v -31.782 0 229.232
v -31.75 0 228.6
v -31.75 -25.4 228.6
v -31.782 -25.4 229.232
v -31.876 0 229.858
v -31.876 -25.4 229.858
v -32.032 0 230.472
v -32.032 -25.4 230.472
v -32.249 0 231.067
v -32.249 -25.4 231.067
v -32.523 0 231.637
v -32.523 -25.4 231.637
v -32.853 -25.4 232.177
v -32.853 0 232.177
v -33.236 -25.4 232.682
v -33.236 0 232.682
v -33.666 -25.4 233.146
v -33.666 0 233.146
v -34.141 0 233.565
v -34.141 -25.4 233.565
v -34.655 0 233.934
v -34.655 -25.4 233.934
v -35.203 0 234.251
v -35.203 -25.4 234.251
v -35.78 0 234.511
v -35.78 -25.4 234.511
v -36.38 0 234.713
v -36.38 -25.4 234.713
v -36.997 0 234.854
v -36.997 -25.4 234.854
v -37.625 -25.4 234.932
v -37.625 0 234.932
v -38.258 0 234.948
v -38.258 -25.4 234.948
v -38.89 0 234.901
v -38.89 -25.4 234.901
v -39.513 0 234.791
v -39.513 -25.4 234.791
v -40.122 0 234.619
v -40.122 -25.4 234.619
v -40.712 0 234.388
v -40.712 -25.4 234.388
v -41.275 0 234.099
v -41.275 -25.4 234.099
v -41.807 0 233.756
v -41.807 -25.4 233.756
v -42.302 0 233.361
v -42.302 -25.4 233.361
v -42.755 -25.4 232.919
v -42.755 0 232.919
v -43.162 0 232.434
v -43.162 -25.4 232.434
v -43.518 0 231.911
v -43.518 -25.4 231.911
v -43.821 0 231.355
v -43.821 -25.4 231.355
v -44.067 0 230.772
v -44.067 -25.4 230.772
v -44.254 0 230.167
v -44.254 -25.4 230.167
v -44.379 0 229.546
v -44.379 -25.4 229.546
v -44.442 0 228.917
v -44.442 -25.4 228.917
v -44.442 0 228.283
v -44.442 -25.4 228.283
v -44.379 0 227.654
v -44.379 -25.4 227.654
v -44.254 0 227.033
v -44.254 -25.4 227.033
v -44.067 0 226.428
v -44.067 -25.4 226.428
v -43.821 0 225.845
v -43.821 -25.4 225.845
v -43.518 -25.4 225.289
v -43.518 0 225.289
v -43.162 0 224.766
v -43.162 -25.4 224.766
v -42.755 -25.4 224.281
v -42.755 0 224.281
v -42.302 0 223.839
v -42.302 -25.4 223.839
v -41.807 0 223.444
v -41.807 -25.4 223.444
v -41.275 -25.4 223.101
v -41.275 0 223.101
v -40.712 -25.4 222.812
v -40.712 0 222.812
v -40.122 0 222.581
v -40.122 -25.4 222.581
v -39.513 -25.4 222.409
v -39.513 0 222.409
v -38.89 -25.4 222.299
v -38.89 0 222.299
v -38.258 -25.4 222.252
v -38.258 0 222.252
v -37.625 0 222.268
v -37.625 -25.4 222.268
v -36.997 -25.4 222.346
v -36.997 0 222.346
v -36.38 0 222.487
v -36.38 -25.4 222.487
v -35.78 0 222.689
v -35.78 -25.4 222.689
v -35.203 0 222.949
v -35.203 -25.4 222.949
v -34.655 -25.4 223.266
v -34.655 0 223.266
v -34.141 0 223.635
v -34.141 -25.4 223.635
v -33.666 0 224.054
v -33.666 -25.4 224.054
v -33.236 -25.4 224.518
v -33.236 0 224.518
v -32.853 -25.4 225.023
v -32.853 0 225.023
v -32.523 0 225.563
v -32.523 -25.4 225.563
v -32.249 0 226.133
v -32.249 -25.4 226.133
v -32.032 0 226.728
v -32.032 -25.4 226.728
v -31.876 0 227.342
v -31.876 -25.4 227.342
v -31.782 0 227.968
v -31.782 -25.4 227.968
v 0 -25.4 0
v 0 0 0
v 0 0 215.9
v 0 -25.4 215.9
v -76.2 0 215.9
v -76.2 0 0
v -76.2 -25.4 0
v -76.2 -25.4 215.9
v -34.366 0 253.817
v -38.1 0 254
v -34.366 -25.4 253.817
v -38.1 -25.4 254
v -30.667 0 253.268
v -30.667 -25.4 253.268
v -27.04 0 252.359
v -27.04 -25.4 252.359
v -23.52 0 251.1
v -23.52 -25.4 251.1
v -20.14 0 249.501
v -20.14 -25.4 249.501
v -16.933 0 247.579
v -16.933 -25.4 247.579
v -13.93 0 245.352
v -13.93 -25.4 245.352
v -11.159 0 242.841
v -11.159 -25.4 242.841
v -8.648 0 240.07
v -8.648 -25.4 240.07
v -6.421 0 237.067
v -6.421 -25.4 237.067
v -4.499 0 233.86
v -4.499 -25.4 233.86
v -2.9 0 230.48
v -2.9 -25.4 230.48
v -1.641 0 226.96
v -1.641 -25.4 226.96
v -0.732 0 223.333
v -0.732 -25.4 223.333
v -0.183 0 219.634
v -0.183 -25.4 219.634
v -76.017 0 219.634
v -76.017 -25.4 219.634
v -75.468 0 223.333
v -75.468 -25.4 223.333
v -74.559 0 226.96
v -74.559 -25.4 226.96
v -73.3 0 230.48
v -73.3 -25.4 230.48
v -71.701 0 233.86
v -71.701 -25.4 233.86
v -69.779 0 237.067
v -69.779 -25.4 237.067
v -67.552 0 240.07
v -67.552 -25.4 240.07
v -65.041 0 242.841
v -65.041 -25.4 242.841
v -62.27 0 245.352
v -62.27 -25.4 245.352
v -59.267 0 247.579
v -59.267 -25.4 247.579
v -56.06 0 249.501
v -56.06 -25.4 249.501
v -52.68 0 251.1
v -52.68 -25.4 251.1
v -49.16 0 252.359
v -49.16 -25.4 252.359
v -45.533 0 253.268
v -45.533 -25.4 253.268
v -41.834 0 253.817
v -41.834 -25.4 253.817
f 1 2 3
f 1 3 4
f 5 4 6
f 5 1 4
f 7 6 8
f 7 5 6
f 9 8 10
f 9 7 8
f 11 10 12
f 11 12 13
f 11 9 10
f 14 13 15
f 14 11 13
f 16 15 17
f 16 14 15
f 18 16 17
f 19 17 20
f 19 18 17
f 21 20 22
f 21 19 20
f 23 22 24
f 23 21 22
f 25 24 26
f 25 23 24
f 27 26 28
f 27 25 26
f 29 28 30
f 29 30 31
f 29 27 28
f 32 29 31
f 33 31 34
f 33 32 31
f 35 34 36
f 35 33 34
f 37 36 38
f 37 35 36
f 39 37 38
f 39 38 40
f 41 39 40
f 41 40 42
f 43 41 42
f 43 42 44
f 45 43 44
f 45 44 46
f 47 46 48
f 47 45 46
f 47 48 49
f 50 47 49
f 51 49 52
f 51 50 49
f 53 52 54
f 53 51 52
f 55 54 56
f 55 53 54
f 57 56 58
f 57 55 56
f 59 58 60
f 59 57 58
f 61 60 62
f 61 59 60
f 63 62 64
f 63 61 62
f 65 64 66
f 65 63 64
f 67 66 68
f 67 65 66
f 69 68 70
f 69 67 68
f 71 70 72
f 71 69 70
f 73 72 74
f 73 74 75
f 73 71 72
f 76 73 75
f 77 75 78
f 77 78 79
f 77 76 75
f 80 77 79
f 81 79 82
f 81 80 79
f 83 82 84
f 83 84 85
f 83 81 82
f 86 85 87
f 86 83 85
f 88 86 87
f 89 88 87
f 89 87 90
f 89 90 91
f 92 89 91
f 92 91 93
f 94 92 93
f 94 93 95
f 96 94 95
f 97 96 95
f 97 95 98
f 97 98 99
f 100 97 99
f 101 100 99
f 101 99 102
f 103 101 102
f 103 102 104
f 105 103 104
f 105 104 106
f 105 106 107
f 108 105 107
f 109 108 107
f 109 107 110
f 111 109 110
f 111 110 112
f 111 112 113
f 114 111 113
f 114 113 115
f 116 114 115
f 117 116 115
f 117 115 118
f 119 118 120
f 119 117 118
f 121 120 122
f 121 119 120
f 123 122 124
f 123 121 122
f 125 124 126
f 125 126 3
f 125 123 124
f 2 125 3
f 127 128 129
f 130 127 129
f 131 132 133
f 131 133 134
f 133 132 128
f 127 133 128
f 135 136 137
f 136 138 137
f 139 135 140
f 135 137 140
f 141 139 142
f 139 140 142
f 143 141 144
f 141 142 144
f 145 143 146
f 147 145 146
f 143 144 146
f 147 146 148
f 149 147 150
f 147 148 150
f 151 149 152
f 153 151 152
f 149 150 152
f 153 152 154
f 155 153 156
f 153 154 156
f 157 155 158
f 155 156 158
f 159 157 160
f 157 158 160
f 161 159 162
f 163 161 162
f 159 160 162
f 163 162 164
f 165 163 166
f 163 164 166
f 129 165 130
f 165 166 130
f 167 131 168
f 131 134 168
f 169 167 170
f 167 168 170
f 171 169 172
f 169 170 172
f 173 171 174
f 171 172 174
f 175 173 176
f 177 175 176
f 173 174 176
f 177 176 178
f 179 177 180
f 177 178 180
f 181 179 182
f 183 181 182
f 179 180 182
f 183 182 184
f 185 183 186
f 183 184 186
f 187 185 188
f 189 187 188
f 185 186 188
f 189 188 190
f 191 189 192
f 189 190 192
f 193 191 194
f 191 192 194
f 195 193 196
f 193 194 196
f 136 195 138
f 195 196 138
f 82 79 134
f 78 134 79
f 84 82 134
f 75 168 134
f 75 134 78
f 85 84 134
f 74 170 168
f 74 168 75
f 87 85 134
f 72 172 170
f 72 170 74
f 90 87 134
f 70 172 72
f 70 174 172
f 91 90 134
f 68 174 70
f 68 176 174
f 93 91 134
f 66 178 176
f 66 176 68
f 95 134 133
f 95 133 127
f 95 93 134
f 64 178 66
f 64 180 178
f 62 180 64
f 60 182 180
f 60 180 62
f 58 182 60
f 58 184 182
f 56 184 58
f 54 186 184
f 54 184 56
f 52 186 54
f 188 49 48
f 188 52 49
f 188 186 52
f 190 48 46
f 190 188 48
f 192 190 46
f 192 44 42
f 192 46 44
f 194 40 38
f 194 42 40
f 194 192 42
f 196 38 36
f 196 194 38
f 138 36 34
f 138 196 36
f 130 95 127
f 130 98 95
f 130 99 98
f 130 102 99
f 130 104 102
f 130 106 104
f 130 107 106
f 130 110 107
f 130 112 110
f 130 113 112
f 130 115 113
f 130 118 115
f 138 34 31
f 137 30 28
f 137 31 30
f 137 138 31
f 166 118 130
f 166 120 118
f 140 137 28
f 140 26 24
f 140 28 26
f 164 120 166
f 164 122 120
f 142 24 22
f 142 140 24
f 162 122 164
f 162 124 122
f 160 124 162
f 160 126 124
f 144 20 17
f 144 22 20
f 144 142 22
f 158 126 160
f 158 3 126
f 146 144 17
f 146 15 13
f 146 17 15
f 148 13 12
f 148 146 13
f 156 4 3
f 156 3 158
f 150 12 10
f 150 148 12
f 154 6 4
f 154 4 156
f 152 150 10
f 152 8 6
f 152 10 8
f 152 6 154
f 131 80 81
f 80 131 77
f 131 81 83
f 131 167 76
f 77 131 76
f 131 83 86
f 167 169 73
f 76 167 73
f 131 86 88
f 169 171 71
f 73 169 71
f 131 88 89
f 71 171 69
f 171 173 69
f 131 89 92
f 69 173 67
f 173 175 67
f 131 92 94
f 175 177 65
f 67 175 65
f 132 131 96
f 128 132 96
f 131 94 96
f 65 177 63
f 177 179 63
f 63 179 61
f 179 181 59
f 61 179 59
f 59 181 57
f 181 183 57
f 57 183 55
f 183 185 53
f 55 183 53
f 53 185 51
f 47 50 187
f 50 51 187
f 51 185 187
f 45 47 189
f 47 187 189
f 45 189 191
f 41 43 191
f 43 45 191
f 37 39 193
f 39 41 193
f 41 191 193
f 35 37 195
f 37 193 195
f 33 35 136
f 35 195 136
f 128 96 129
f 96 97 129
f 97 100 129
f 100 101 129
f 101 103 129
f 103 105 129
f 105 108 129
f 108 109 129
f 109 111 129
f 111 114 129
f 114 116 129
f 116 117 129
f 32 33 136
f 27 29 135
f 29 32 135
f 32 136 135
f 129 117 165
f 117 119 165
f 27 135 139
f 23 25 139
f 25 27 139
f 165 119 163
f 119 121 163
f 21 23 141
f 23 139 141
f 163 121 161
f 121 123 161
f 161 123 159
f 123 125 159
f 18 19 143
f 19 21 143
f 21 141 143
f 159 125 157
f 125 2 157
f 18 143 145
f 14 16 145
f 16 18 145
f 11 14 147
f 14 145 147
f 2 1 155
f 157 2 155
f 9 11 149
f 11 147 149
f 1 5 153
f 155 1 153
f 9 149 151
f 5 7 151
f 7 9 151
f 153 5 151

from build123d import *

# Parameters (mm, degrees)
F0_W     = 76.2
F0_H     = 254
F0_R     = 6.35
F1_DEPTH = 25.4
F2_R     = 38.09999


# Not quite as in the source:
# - a fillet or chamfer is up to 0.001 mm smaller than in the source, because OpenCascade refuses the exact size


with BuildPart() as f1:
    # F0 (on Front) → F1 (new body)
    with BuildSketch(Plane.XZ):
        with Locations((-38.1, 127)):
            Rectangle(F0_W, F0_H)
        with Locations((-38.1, 228.6)):
            Circle(F0_R, mode=Mode.SUBTRACT)
    extrude(amount=F1_DEPTH)

    # F2 (radius 38.1 in the source; OpenCascade refuses exactly that, so slightly less here)
    f2_edges = [f1.edges().sort_by_distance(p)[0] for p in [
        (-76.2, -12.7, 254),
        (0, -12.7, 254),
    ]]
    fillet(f2_edges, radius=F2_R)


solid = f1.part
